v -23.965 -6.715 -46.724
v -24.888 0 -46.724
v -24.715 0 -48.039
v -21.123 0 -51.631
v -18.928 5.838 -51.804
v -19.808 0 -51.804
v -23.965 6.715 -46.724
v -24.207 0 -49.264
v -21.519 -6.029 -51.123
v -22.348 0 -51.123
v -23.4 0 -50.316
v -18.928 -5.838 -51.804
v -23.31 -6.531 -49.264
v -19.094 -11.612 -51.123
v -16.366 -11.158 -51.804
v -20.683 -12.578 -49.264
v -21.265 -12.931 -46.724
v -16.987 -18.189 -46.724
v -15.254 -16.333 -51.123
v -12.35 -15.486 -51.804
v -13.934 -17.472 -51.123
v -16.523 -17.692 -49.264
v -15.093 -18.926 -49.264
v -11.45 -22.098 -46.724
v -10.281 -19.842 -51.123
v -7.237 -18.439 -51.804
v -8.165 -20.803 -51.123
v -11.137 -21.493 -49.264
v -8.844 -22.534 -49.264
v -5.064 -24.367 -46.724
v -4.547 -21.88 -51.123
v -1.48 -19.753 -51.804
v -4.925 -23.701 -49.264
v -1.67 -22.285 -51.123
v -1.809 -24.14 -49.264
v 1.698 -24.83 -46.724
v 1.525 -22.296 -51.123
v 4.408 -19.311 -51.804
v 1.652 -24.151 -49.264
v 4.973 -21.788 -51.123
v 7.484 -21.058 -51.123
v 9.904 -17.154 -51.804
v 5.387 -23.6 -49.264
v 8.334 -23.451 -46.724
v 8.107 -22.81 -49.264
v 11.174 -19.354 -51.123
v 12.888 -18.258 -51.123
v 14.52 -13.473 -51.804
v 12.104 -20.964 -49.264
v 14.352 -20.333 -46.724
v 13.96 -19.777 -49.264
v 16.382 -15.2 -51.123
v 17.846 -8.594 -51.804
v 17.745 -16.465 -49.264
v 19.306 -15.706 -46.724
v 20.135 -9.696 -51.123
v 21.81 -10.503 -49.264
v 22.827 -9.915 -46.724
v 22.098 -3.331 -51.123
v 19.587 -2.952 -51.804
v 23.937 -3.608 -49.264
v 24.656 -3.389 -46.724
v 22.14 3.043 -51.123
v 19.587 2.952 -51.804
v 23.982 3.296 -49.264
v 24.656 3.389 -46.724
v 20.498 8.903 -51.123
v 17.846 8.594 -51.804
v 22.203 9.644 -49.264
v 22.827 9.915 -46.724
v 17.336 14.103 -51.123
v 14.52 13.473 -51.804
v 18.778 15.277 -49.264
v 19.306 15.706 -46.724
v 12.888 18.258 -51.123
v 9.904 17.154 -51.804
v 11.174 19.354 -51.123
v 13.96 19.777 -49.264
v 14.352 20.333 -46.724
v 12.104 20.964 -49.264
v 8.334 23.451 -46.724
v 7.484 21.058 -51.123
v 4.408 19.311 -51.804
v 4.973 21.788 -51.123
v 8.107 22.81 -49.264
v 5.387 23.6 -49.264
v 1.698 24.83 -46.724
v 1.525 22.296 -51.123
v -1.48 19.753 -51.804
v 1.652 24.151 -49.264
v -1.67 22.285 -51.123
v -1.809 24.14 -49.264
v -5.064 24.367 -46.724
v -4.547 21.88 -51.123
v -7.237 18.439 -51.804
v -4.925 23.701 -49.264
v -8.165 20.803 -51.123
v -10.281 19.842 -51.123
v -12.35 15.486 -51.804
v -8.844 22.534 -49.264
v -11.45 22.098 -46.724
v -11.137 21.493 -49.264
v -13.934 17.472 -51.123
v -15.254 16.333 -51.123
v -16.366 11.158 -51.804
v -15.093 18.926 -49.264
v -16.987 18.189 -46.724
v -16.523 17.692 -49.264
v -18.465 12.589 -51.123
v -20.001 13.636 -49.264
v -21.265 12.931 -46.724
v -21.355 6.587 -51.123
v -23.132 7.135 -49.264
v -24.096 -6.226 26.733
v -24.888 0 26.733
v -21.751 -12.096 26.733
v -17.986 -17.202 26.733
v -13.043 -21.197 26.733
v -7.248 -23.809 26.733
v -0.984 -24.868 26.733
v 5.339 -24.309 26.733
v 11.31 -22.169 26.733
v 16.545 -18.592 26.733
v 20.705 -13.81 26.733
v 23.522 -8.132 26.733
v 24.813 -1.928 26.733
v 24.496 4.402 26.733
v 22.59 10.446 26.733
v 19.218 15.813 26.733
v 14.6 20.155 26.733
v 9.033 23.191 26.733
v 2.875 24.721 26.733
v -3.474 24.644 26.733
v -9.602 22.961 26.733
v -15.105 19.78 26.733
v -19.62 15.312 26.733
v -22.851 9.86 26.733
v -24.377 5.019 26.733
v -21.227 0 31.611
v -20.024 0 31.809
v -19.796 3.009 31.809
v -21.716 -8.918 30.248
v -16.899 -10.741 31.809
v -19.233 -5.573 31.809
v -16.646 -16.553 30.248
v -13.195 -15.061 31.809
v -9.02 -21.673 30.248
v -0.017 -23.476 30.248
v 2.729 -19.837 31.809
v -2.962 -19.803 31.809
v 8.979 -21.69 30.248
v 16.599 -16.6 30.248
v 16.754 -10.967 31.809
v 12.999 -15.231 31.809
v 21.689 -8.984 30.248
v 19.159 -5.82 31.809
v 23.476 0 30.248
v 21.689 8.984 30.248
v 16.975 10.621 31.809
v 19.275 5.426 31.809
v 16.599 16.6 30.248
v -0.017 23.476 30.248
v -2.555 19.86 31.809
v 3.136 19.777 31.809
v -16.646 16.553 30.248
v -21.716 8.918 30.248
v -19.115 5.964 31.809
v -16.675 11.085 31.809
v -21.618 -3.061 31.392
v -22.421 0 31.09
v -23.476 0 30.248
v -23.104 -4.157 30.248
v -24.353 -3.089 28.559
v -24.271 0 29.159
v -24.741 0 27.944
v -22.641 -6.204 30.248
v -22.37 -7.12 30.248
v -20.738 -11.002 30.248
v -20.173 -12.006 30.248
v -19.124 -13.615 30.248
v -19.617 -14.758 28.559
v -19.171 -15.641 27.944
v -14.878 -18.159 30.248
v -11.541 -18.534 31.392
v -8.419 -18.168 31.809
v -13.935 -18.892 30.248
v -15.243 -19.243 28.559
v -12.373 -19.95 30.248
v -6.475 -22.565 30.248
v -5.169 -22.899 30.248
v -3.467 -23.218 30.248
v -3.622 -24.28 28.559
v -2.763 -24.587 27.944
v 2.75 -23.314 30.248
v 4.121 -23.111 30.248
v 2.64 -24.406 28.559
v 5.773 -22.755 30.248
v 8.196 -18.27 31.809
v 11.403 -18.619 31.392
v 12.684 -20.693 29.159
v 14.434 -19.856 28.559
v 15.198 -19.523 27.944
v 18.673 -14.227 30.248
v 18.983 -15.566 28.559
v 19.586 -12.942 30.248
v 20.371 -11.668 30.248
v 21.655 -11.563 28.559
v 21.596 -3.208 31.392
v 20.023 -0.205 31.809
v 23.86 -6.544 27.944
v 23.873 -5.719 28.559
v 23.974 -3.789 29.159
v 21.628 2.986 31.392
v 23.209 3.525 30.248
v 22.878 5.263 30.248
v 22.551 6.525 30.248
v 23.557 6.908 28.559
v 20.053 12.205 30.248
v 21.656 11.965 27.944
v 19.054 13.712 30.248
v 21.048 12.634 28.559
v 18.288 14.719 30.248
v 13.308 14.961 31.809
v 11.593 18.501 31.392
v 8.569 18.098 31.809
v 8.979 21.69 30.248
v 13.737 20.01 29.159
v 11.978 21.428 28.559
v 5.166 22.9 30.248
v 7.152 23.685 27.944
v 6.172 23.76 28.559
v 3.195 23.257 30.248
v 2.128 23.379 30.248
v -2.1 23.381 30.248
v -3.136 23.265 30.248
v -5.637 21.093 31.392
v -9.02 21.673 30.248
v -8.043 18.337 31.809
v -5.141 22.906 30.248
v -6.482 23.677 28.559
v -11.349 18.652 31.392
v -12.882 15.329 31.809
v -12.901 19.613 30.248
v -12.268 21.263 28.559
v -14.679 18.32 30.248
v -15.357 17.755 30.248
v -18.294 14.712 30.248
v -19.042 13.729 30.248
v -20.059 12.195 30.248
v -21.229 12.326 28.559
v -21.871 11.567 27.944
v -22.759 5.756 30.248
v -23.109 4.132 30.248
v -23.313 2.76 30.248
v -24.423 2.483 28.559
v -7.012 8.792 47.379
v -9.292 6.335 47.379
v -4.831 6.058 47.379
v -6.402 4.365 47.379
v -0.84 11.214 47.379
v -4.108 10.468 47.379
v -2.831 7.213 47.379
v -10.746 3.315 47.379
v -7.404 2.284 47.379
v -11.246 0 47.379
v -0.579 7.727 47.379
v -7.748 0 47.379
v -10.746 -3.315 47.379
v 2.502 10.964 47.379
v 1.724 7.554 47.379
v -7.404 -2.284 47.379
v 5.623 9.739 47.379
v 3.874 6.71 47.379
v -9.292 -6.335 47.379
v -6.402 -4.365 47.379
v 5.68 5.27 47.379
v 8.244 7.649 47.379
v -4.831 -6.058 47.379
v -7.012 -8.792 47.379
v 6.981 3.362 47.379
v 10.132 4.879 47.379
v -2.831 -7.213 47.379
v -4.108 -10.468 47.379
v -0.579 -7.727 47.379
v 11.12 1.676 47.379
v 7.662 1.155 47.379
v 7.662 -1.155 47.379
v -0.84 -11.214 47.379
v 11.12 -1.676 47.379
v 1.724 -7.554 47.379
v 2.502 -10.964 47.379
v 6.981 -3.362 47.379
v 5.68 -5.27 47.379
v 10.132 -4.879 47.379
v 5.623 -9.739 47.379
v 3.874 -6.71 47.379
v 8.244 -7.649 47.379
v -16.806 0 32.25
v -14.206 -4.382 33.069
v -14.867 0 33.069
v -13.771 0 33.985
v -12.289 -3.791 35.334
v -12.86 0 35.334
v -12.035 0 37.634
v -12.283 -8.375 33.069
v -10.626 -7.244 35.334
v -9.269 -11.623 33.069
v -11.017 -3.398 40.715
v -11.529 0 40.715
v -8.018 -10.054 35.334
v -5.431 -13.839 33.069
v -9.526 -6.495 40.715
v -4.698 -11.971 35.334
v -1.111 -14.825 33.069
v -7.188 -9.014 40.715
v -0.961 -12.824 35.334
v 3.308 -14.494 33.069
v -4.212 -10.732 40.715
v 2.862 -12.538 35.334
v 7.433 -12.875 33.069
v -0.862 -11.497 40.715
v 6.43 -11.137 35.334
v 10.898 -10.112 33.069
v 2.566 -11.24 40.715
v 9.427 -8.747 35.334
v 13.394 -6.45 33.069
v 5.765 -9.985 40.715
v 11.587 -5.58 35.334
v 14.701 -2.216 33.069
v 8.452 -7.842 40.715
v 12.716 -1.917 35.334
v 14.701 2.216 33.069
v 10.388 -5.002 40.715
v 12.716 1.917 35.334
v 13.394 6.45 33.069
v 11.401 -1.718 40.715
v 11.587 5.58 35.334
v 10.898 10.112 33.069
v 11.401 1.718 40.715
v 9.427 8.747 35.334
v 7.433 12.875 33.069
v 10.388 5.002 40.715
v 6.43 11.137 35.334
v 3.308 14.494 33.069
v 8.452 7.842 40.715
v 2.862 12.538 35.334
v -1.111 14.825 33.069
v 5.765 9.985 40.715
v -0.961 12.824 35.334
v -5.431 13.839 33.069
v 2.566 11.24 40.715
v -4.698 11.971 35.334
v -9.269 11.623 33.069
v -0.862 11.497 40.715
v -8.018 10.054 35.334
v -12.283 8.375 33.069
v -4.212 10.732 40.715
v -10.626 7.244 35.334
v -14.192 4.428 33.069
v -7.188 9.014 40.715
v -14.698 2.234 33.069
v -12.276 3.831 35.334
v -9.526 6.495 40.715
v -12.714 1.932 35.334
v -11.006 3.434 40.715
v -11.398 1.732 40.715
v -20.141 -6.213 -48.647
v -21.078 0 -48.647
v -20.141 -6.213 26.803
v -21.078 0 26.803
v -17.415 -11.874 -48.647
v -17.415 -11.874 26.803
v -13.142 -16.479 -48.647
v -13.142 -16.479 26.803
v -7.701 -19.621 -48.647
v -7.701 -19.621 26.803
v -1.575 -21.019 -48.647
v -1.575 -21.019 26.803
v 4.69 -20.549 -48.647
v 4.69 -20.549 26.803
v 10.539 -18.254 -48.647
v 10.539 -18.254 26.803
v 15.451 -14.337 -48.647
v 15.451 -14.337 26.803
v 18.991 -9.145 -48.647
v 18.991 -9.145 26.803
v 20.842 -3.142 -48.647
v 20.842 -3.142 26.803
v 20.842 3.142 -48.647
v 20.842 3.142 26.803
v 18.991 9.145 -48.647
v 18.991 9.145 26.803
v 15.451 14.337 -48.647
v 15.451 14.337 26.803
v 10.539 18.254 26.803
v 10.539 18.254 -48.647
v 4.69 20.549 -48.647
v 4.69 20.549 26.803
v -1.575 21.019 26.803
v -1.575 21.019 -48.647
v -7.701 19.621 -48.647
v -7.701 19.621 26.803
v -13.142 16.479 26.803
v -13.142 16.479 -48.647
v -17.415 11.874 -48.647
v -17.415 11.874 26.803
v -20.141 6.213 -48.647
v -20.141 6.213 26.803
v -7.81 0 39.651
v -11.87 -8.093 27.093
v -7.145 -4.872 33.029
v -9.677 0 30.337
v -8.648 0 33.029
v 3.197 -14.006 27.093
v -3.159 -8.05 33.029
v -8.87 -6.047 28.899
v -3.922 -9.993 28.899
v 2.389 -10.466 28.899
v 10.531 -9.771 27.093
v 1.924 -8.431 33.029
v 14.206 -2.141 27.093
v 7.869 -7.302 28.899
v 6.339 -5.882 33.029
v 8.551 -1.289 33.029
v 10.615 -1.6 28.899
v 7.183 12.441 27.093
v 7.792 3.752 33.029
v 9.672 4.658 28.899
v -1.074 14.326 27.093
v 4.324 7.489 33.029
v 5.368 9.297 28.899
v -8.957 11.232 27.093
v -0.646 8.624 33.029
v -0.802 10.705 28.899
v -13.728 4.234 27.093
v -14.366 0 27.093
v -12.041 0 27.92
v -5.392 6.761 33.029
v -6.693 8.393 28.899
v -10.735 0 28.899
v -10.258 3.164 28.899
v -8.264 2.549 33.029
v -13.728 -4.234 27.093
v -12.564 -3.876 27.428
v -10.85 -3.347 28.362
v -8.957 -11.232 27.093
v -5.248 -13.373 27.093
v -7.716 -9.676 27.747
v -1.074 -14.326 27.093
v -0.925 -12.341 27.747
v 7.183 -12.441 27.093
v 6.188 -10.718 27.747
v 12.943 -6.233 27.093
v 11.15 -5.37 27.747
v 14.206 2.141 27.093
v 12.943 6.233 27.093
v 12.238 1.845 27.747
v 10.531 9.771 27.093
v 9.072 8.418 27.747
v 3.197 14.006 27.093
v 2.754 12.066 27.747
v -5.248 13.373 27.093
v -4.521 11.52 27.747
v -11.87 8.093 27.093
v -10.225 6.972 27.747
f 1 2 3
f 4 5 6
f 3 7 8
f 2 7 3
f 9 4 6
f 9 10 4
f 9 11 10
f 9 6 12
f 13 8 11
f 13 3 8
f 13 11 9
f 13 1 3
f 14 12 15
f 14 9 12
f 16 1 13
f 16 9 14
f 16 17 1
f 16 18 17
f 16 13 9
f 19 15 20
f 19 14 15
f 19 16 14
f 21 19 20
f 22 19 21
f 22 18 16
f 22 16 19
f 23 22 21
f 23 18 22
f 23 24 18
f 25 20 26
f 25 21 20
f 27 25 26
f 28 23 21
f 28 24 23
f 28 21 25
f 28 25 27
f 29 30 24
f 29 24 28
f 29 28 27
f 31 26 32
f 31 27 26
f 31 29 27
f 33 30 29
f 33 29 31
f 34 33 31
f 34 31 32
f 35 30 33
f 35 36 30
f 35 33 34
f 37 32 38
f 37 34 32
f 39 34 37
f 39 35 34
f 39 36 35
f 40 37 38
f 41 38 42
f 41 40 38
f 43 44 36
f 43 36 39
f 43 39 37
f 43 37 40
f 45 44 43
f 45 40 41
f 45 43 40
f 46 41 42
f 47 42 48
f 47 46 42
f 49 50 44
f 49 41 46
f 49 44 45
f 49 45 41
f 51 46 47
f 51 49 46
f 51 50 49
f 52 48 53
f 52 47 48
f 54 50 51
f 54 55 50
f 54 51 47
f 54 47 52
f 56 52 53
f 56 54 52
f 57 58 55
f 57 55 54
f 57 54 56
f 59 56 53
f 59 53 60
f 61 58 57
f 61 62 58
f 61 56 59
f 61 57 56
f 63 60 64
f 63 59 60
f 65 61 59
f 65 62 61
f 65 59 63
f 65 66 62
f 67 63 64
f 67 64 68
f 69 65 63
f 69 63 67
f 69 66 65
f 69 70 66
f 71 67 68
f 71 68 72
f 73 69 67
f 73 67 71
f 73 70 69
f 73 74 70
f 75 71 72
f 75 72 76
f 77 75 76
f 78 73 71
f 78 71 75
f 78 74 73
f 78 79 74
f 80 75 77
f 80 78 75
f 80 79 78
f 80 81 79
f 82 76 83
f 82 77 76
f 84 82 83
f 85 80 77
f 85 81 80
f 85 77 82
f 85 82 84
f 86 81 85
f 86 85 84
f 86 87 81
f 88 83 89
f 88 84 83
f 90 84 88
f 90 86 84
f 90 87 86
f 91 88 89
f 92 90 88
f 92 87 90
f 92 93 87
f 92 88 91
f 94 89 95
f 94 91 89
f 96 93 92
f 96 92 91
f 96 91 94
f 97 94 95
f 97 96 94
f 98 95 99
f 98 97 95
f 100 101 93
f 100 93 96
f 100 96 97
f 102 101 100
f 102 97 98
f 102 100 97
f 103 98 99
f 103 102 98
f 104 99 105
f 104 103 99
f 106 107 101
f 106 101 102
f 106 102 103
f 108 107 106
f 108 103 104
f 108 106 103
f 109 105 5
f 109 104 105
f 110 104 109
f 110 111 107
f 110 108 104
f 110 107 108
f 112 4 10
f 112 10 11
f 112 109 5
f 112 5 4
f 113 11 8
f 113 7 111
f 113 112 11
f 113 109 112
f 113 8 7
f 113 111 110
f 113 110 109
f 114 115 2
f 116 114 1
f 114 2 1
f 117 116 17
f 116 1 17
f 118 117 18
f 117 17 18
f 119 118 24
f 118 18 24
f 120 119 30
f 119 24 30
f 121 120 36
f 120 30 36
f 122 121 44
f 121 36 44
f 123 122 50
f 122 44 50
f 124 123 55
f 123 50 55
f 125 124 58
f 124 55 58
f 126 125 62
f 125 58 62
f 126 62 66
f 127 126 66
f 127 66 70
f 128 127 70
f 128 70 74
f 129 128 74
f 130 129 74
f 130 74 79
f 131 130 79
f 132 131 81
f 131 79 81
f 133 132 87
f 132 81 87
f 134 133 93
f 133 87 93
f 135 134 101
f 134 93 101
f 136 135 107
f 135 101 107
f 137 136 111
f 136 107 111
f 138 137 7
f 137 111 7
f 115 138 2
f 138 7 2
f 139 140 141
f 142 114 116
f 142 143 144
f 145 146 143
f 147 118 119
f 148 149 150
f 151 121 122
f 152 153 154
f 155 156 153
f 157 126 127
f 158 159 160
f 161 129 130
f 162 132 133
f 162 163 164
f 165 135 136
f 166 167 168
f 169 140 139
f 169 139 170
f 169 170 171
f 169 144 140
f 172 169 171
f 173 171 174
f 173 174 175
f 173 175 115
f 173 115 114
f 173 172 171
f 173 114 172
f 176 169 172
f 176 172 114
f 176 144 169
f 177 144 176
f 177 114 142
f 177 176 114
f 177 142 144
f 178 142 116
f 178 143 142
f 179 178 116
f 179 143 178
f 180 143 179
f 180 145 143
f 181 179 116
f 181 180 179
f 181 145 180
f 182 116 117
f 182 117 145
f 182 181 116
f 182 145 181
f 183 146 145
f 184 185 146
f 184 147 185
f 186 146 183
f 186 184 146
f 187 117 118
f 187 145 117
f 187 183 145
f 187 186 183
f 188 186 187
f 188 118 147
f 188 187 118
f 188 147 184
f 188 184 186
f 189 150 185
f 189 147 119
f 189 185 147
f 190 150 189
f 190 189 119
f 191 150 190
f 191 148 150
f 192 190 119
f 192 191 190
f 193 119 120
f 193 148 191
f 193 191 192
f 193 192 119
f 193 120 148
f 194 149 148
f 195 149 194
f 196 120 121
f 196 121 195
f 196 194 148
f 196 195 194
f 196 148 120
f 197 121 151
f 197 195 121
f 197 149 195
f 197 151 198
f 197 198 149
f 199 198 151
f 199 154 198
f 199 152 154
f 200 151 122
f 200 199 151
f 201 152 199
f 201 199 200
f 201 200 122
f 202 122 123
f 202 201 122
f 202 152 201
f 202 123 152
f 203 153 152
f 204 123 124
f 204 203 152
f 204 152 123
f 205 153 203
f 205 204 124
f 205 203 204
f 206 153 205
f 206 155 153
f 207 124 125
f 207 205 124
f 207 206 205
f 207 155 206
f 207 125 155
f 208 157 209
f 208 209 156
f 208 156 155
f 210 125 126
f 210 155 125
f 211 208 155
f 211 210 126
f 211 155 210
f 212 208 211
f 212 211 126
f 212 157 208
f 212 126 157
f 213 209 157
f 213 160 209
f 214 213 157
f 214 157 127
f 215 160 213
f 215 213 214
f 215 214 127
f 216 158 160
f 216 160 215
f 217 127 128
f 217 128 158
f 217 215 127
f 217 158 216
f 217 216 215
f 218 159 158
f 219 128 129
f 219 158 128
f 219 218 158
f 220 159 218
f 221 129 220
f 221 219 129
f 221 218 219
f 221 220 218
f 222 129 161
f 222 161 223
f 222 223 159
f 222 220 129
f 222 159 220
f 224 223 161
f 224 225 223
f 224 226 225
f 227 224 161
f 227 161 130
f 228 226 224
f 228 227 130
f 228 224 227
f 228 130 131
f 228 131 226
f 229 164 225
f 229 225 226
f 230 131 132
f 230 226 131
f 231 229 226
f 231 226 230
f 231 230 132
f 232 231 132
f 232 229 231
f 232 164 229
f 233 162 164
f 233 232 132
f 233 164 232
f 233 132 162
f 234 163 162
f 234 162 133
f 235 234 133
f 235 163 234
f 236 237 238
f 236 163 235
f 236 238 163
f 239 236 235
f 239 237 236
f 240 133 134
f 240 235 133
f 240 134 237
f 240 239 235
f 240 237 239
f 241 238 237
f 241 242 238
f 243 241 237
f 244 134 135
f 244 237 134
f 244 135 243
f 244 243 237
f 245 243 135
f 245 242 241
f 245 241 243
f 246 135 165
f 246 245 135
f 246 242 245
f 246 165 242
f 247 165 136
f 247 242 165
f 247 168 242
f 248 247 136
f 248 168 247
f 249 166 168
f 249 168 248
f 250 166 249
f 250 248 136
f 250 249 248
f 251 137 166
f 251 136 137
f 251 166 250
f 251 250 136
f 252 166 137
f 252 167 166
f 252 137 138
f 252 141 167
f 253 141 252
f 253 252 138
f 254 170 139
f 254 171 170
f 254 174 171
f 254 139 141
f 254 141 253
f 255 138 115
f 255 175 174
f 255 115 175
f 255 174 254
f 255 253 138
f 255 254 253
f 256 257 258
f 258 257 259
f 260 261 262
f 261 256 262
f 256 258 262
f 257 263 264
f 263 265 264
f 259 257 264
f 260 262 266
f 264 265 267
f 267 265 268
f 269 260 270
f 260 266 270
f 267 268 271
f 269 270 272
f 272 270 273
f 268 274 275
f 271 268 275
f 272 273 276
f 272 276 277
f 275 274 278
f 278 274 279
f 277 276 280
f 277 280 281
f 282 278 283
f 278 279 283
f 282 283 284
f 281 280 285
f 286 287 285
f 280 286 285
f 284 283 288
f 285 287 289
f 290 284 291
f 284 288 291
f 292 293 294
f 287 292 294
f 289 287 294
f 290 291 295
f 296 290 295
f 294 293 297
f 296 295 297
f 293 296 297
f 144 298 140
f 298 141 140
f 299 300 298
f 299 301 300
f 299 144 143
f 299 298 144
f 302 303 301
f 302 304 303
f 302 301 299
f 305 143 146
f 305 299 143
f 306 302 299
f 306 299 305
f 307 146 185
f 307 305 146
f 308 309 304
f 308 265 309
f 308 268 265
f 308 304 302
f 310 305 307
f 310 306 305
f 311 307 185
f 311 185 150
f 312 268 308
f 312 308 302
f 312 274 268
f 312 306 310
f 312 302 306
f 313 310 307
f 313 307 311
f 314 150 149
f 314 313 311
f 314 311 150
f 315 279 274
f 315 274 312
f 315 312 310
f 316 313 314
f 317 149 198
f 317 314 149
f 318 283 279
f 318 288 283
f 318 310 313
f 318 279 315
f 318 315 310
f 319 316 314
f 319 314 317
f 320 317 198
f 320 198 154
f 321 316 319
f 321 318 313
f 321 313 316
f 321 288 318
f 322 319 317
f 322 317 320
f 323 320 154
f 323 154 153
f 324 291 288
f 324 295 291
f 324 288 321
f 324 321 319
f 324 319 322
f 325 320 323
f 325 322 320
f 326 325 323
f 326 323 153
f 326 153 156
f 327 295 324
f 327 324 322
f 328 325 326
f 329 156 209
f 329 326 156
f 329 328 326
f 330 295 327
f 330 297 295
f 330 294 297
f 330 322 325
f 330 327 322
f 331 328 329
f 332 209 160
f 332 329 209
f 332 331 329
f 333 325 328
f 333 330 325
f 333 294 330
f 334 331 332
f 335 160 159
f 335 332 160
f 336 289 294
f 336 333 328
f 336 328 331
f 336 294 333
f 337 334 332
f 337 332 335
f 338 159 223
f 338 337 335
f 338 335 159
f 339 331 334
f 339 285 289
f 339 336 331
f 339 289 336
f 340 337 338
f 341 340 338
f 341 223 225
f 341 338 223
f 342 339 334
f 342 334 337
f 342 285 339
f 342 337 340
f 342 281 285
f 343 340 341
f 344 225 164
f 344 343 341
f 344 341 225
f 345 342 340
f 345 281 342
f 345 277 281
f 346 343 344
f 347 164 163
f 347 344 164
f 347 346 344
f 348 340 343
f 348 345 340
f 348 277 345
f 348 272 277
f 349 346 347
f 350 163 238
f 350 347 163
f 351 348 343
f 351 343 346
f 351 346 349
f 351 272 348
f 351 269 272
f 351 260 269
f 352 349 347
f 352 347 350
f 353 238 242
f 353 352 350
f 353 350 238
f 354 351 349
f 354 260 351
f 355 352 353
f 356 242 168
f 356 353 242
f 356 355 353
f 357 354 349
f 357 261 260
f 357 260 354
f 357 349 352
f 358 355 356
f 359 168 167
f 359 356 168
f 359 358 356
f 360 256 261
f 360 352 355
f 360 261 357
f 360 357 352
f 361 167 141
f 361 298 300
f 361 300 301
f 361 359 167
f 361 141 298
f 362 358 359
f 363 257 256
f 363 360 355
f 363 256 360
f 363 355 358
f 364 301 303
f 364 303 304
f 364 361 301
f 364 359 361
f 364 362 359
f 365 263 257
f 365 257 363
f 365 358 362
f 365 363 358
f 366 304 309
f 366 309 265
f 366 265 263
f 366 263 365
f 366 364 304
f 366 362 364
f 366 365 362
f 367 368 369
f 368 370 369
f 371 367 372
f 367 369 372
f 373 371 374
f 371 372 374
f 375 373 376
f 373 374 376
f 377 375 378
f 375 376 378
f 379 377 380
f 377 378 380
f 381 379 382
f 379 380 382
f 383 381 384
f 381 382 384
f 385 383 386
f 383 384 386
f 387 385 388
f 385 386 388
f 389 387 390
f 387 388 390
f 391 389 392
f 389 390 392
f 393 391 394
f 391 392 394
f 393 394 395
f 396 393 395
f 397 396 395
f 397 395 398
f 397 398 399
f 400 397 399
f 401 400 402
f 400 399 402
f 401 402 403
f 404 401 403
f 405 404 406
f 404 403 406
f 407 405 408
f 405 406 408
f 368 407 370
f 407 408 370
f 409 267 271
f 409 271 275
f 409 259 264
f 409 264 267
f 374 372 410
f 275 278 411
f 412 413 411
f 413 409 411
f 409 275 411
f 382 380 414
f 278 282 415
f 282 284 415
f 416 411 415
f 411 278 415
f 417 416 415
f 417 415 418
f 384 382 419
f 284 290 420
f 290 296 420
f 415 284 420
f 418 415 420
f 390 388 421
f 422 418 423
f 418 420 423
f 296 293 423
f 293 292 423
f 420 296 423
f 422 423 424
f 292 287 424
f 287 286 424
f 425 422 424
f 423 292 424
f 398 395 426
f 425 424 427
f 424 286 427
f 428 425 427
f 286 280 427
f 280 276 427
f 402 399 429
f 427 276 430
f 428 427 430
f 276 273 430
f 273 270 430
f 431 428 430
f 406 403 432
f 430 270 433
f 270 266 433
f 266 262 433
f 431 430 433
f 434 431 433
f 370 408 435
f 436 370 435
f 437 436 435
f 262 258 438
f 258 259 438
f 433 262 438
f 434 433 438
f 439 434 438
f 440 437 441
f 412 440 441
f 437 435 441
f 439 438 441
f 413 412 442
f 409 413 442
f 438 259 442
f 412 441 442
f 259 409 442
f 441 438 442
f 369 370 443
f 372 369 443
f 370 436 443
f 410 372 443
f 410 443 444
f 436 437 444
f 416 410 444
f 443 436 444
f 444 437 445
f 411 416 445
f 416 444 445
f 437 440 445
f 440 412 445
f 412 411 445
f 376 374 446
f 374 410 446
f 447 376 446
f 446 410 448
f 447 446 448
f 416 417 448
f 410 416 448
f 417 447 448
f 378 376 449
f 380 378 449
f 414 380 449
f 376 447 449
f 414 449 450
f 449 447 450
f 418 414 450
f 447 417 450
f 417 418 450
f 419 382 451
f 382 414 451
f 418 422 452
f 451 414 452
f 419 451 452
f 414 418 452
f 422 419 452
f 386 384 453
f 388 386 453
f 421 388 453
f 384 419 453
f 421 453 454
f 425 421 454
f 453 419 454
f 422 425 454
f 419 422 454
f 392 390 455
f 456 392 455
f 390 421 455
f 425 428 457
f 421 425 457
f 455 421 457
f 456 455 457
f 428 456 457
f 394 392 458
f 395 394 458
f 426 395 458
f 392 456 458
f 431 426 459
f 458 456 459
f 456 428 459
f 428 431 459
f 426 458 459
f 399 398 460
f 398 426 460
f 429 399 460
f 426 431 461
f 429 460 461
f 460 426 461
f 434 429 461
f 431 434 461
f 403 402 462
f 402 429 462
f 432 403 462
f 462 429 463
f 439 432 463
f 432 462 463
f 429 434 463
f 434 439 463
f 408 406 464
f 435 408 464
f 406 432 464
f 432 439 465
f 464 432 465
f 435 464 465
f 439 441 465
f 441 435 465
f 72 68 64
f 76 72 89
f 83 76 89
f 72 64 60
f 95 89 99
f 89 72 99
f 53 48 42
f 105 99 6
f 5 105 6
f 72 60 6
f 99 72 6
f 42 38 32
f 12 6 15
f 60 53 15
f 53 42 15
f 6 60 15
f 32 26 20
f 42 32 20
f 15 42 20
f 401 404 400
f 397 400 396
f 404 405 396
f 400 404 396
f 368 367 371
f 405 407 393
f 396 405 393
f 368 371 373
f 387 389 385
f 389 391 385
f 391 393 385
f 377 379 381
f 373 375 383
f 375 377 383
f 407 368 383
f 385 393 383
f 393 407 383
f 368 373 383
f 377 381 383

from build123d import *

# Parameters (mm, degrees)
F2_R = 5.08


with BuildPart() as f1:
    # F0 (on Front) → F1 (revolve)
    with BuildSketch(Plane.XZ):
        with BuildLine():
            add(Edge.make_bspline(
                [(-24.8879026622, 31.8933874369), (-20.6017141272, 31.6992866838), (-11.5009510836, 31.2871571318), (-11.333978859, 41.8115008895), (-11.2456455827, 47.3791919649)],
                knots=[0, 0, 0, 0, 0.4709702378, 1, 1, 1, 1], degree=3))
            Line((-24.8879026622, 31.8933874369), (-24.8879026622, -51.8037118018))
            Line((-24.8879026622, -51.8037118018), (0, -51.8037118018))
            Line((0, -51.8037118018), (0, -48.6473329365))
            Line((0, -48.6473329365), (-21.0779197514, -48.6473329365))
            Line((-21.0779197514, -48.6473329365), (-21.0779197514, 26.8034059554))
            add(Edge.make_bspline(
                [(-21.0779197514, 26.8034059554), (-17.0118151699, 26.6887101437), (-7.5695126443, 26.4223636859), (-7.6835473889, 39.7759896477), (-7.7484757639, 47.3791919649)],
                knots=[0, 0, 0, 0, 0.4306263828, 1, 1, 1, 1], degree=3))
            Line((-7.7484757639, 47.3791919649), (-11.2456455827, 47.3791919649))
        make_face()
    revolve(axis=Axis((0, 0, -2.2122599185), (0, 0, 1)))

    # F2
    f2_edges = [f1.edges().sort_by_distance(p)[0] for p in [
        (24.887903, 0, 31.893387),
        (24.887903, 0, -51.803712),
    ]]
    fillet(f2_edges, radius=F2_R)


solid = f1.part
